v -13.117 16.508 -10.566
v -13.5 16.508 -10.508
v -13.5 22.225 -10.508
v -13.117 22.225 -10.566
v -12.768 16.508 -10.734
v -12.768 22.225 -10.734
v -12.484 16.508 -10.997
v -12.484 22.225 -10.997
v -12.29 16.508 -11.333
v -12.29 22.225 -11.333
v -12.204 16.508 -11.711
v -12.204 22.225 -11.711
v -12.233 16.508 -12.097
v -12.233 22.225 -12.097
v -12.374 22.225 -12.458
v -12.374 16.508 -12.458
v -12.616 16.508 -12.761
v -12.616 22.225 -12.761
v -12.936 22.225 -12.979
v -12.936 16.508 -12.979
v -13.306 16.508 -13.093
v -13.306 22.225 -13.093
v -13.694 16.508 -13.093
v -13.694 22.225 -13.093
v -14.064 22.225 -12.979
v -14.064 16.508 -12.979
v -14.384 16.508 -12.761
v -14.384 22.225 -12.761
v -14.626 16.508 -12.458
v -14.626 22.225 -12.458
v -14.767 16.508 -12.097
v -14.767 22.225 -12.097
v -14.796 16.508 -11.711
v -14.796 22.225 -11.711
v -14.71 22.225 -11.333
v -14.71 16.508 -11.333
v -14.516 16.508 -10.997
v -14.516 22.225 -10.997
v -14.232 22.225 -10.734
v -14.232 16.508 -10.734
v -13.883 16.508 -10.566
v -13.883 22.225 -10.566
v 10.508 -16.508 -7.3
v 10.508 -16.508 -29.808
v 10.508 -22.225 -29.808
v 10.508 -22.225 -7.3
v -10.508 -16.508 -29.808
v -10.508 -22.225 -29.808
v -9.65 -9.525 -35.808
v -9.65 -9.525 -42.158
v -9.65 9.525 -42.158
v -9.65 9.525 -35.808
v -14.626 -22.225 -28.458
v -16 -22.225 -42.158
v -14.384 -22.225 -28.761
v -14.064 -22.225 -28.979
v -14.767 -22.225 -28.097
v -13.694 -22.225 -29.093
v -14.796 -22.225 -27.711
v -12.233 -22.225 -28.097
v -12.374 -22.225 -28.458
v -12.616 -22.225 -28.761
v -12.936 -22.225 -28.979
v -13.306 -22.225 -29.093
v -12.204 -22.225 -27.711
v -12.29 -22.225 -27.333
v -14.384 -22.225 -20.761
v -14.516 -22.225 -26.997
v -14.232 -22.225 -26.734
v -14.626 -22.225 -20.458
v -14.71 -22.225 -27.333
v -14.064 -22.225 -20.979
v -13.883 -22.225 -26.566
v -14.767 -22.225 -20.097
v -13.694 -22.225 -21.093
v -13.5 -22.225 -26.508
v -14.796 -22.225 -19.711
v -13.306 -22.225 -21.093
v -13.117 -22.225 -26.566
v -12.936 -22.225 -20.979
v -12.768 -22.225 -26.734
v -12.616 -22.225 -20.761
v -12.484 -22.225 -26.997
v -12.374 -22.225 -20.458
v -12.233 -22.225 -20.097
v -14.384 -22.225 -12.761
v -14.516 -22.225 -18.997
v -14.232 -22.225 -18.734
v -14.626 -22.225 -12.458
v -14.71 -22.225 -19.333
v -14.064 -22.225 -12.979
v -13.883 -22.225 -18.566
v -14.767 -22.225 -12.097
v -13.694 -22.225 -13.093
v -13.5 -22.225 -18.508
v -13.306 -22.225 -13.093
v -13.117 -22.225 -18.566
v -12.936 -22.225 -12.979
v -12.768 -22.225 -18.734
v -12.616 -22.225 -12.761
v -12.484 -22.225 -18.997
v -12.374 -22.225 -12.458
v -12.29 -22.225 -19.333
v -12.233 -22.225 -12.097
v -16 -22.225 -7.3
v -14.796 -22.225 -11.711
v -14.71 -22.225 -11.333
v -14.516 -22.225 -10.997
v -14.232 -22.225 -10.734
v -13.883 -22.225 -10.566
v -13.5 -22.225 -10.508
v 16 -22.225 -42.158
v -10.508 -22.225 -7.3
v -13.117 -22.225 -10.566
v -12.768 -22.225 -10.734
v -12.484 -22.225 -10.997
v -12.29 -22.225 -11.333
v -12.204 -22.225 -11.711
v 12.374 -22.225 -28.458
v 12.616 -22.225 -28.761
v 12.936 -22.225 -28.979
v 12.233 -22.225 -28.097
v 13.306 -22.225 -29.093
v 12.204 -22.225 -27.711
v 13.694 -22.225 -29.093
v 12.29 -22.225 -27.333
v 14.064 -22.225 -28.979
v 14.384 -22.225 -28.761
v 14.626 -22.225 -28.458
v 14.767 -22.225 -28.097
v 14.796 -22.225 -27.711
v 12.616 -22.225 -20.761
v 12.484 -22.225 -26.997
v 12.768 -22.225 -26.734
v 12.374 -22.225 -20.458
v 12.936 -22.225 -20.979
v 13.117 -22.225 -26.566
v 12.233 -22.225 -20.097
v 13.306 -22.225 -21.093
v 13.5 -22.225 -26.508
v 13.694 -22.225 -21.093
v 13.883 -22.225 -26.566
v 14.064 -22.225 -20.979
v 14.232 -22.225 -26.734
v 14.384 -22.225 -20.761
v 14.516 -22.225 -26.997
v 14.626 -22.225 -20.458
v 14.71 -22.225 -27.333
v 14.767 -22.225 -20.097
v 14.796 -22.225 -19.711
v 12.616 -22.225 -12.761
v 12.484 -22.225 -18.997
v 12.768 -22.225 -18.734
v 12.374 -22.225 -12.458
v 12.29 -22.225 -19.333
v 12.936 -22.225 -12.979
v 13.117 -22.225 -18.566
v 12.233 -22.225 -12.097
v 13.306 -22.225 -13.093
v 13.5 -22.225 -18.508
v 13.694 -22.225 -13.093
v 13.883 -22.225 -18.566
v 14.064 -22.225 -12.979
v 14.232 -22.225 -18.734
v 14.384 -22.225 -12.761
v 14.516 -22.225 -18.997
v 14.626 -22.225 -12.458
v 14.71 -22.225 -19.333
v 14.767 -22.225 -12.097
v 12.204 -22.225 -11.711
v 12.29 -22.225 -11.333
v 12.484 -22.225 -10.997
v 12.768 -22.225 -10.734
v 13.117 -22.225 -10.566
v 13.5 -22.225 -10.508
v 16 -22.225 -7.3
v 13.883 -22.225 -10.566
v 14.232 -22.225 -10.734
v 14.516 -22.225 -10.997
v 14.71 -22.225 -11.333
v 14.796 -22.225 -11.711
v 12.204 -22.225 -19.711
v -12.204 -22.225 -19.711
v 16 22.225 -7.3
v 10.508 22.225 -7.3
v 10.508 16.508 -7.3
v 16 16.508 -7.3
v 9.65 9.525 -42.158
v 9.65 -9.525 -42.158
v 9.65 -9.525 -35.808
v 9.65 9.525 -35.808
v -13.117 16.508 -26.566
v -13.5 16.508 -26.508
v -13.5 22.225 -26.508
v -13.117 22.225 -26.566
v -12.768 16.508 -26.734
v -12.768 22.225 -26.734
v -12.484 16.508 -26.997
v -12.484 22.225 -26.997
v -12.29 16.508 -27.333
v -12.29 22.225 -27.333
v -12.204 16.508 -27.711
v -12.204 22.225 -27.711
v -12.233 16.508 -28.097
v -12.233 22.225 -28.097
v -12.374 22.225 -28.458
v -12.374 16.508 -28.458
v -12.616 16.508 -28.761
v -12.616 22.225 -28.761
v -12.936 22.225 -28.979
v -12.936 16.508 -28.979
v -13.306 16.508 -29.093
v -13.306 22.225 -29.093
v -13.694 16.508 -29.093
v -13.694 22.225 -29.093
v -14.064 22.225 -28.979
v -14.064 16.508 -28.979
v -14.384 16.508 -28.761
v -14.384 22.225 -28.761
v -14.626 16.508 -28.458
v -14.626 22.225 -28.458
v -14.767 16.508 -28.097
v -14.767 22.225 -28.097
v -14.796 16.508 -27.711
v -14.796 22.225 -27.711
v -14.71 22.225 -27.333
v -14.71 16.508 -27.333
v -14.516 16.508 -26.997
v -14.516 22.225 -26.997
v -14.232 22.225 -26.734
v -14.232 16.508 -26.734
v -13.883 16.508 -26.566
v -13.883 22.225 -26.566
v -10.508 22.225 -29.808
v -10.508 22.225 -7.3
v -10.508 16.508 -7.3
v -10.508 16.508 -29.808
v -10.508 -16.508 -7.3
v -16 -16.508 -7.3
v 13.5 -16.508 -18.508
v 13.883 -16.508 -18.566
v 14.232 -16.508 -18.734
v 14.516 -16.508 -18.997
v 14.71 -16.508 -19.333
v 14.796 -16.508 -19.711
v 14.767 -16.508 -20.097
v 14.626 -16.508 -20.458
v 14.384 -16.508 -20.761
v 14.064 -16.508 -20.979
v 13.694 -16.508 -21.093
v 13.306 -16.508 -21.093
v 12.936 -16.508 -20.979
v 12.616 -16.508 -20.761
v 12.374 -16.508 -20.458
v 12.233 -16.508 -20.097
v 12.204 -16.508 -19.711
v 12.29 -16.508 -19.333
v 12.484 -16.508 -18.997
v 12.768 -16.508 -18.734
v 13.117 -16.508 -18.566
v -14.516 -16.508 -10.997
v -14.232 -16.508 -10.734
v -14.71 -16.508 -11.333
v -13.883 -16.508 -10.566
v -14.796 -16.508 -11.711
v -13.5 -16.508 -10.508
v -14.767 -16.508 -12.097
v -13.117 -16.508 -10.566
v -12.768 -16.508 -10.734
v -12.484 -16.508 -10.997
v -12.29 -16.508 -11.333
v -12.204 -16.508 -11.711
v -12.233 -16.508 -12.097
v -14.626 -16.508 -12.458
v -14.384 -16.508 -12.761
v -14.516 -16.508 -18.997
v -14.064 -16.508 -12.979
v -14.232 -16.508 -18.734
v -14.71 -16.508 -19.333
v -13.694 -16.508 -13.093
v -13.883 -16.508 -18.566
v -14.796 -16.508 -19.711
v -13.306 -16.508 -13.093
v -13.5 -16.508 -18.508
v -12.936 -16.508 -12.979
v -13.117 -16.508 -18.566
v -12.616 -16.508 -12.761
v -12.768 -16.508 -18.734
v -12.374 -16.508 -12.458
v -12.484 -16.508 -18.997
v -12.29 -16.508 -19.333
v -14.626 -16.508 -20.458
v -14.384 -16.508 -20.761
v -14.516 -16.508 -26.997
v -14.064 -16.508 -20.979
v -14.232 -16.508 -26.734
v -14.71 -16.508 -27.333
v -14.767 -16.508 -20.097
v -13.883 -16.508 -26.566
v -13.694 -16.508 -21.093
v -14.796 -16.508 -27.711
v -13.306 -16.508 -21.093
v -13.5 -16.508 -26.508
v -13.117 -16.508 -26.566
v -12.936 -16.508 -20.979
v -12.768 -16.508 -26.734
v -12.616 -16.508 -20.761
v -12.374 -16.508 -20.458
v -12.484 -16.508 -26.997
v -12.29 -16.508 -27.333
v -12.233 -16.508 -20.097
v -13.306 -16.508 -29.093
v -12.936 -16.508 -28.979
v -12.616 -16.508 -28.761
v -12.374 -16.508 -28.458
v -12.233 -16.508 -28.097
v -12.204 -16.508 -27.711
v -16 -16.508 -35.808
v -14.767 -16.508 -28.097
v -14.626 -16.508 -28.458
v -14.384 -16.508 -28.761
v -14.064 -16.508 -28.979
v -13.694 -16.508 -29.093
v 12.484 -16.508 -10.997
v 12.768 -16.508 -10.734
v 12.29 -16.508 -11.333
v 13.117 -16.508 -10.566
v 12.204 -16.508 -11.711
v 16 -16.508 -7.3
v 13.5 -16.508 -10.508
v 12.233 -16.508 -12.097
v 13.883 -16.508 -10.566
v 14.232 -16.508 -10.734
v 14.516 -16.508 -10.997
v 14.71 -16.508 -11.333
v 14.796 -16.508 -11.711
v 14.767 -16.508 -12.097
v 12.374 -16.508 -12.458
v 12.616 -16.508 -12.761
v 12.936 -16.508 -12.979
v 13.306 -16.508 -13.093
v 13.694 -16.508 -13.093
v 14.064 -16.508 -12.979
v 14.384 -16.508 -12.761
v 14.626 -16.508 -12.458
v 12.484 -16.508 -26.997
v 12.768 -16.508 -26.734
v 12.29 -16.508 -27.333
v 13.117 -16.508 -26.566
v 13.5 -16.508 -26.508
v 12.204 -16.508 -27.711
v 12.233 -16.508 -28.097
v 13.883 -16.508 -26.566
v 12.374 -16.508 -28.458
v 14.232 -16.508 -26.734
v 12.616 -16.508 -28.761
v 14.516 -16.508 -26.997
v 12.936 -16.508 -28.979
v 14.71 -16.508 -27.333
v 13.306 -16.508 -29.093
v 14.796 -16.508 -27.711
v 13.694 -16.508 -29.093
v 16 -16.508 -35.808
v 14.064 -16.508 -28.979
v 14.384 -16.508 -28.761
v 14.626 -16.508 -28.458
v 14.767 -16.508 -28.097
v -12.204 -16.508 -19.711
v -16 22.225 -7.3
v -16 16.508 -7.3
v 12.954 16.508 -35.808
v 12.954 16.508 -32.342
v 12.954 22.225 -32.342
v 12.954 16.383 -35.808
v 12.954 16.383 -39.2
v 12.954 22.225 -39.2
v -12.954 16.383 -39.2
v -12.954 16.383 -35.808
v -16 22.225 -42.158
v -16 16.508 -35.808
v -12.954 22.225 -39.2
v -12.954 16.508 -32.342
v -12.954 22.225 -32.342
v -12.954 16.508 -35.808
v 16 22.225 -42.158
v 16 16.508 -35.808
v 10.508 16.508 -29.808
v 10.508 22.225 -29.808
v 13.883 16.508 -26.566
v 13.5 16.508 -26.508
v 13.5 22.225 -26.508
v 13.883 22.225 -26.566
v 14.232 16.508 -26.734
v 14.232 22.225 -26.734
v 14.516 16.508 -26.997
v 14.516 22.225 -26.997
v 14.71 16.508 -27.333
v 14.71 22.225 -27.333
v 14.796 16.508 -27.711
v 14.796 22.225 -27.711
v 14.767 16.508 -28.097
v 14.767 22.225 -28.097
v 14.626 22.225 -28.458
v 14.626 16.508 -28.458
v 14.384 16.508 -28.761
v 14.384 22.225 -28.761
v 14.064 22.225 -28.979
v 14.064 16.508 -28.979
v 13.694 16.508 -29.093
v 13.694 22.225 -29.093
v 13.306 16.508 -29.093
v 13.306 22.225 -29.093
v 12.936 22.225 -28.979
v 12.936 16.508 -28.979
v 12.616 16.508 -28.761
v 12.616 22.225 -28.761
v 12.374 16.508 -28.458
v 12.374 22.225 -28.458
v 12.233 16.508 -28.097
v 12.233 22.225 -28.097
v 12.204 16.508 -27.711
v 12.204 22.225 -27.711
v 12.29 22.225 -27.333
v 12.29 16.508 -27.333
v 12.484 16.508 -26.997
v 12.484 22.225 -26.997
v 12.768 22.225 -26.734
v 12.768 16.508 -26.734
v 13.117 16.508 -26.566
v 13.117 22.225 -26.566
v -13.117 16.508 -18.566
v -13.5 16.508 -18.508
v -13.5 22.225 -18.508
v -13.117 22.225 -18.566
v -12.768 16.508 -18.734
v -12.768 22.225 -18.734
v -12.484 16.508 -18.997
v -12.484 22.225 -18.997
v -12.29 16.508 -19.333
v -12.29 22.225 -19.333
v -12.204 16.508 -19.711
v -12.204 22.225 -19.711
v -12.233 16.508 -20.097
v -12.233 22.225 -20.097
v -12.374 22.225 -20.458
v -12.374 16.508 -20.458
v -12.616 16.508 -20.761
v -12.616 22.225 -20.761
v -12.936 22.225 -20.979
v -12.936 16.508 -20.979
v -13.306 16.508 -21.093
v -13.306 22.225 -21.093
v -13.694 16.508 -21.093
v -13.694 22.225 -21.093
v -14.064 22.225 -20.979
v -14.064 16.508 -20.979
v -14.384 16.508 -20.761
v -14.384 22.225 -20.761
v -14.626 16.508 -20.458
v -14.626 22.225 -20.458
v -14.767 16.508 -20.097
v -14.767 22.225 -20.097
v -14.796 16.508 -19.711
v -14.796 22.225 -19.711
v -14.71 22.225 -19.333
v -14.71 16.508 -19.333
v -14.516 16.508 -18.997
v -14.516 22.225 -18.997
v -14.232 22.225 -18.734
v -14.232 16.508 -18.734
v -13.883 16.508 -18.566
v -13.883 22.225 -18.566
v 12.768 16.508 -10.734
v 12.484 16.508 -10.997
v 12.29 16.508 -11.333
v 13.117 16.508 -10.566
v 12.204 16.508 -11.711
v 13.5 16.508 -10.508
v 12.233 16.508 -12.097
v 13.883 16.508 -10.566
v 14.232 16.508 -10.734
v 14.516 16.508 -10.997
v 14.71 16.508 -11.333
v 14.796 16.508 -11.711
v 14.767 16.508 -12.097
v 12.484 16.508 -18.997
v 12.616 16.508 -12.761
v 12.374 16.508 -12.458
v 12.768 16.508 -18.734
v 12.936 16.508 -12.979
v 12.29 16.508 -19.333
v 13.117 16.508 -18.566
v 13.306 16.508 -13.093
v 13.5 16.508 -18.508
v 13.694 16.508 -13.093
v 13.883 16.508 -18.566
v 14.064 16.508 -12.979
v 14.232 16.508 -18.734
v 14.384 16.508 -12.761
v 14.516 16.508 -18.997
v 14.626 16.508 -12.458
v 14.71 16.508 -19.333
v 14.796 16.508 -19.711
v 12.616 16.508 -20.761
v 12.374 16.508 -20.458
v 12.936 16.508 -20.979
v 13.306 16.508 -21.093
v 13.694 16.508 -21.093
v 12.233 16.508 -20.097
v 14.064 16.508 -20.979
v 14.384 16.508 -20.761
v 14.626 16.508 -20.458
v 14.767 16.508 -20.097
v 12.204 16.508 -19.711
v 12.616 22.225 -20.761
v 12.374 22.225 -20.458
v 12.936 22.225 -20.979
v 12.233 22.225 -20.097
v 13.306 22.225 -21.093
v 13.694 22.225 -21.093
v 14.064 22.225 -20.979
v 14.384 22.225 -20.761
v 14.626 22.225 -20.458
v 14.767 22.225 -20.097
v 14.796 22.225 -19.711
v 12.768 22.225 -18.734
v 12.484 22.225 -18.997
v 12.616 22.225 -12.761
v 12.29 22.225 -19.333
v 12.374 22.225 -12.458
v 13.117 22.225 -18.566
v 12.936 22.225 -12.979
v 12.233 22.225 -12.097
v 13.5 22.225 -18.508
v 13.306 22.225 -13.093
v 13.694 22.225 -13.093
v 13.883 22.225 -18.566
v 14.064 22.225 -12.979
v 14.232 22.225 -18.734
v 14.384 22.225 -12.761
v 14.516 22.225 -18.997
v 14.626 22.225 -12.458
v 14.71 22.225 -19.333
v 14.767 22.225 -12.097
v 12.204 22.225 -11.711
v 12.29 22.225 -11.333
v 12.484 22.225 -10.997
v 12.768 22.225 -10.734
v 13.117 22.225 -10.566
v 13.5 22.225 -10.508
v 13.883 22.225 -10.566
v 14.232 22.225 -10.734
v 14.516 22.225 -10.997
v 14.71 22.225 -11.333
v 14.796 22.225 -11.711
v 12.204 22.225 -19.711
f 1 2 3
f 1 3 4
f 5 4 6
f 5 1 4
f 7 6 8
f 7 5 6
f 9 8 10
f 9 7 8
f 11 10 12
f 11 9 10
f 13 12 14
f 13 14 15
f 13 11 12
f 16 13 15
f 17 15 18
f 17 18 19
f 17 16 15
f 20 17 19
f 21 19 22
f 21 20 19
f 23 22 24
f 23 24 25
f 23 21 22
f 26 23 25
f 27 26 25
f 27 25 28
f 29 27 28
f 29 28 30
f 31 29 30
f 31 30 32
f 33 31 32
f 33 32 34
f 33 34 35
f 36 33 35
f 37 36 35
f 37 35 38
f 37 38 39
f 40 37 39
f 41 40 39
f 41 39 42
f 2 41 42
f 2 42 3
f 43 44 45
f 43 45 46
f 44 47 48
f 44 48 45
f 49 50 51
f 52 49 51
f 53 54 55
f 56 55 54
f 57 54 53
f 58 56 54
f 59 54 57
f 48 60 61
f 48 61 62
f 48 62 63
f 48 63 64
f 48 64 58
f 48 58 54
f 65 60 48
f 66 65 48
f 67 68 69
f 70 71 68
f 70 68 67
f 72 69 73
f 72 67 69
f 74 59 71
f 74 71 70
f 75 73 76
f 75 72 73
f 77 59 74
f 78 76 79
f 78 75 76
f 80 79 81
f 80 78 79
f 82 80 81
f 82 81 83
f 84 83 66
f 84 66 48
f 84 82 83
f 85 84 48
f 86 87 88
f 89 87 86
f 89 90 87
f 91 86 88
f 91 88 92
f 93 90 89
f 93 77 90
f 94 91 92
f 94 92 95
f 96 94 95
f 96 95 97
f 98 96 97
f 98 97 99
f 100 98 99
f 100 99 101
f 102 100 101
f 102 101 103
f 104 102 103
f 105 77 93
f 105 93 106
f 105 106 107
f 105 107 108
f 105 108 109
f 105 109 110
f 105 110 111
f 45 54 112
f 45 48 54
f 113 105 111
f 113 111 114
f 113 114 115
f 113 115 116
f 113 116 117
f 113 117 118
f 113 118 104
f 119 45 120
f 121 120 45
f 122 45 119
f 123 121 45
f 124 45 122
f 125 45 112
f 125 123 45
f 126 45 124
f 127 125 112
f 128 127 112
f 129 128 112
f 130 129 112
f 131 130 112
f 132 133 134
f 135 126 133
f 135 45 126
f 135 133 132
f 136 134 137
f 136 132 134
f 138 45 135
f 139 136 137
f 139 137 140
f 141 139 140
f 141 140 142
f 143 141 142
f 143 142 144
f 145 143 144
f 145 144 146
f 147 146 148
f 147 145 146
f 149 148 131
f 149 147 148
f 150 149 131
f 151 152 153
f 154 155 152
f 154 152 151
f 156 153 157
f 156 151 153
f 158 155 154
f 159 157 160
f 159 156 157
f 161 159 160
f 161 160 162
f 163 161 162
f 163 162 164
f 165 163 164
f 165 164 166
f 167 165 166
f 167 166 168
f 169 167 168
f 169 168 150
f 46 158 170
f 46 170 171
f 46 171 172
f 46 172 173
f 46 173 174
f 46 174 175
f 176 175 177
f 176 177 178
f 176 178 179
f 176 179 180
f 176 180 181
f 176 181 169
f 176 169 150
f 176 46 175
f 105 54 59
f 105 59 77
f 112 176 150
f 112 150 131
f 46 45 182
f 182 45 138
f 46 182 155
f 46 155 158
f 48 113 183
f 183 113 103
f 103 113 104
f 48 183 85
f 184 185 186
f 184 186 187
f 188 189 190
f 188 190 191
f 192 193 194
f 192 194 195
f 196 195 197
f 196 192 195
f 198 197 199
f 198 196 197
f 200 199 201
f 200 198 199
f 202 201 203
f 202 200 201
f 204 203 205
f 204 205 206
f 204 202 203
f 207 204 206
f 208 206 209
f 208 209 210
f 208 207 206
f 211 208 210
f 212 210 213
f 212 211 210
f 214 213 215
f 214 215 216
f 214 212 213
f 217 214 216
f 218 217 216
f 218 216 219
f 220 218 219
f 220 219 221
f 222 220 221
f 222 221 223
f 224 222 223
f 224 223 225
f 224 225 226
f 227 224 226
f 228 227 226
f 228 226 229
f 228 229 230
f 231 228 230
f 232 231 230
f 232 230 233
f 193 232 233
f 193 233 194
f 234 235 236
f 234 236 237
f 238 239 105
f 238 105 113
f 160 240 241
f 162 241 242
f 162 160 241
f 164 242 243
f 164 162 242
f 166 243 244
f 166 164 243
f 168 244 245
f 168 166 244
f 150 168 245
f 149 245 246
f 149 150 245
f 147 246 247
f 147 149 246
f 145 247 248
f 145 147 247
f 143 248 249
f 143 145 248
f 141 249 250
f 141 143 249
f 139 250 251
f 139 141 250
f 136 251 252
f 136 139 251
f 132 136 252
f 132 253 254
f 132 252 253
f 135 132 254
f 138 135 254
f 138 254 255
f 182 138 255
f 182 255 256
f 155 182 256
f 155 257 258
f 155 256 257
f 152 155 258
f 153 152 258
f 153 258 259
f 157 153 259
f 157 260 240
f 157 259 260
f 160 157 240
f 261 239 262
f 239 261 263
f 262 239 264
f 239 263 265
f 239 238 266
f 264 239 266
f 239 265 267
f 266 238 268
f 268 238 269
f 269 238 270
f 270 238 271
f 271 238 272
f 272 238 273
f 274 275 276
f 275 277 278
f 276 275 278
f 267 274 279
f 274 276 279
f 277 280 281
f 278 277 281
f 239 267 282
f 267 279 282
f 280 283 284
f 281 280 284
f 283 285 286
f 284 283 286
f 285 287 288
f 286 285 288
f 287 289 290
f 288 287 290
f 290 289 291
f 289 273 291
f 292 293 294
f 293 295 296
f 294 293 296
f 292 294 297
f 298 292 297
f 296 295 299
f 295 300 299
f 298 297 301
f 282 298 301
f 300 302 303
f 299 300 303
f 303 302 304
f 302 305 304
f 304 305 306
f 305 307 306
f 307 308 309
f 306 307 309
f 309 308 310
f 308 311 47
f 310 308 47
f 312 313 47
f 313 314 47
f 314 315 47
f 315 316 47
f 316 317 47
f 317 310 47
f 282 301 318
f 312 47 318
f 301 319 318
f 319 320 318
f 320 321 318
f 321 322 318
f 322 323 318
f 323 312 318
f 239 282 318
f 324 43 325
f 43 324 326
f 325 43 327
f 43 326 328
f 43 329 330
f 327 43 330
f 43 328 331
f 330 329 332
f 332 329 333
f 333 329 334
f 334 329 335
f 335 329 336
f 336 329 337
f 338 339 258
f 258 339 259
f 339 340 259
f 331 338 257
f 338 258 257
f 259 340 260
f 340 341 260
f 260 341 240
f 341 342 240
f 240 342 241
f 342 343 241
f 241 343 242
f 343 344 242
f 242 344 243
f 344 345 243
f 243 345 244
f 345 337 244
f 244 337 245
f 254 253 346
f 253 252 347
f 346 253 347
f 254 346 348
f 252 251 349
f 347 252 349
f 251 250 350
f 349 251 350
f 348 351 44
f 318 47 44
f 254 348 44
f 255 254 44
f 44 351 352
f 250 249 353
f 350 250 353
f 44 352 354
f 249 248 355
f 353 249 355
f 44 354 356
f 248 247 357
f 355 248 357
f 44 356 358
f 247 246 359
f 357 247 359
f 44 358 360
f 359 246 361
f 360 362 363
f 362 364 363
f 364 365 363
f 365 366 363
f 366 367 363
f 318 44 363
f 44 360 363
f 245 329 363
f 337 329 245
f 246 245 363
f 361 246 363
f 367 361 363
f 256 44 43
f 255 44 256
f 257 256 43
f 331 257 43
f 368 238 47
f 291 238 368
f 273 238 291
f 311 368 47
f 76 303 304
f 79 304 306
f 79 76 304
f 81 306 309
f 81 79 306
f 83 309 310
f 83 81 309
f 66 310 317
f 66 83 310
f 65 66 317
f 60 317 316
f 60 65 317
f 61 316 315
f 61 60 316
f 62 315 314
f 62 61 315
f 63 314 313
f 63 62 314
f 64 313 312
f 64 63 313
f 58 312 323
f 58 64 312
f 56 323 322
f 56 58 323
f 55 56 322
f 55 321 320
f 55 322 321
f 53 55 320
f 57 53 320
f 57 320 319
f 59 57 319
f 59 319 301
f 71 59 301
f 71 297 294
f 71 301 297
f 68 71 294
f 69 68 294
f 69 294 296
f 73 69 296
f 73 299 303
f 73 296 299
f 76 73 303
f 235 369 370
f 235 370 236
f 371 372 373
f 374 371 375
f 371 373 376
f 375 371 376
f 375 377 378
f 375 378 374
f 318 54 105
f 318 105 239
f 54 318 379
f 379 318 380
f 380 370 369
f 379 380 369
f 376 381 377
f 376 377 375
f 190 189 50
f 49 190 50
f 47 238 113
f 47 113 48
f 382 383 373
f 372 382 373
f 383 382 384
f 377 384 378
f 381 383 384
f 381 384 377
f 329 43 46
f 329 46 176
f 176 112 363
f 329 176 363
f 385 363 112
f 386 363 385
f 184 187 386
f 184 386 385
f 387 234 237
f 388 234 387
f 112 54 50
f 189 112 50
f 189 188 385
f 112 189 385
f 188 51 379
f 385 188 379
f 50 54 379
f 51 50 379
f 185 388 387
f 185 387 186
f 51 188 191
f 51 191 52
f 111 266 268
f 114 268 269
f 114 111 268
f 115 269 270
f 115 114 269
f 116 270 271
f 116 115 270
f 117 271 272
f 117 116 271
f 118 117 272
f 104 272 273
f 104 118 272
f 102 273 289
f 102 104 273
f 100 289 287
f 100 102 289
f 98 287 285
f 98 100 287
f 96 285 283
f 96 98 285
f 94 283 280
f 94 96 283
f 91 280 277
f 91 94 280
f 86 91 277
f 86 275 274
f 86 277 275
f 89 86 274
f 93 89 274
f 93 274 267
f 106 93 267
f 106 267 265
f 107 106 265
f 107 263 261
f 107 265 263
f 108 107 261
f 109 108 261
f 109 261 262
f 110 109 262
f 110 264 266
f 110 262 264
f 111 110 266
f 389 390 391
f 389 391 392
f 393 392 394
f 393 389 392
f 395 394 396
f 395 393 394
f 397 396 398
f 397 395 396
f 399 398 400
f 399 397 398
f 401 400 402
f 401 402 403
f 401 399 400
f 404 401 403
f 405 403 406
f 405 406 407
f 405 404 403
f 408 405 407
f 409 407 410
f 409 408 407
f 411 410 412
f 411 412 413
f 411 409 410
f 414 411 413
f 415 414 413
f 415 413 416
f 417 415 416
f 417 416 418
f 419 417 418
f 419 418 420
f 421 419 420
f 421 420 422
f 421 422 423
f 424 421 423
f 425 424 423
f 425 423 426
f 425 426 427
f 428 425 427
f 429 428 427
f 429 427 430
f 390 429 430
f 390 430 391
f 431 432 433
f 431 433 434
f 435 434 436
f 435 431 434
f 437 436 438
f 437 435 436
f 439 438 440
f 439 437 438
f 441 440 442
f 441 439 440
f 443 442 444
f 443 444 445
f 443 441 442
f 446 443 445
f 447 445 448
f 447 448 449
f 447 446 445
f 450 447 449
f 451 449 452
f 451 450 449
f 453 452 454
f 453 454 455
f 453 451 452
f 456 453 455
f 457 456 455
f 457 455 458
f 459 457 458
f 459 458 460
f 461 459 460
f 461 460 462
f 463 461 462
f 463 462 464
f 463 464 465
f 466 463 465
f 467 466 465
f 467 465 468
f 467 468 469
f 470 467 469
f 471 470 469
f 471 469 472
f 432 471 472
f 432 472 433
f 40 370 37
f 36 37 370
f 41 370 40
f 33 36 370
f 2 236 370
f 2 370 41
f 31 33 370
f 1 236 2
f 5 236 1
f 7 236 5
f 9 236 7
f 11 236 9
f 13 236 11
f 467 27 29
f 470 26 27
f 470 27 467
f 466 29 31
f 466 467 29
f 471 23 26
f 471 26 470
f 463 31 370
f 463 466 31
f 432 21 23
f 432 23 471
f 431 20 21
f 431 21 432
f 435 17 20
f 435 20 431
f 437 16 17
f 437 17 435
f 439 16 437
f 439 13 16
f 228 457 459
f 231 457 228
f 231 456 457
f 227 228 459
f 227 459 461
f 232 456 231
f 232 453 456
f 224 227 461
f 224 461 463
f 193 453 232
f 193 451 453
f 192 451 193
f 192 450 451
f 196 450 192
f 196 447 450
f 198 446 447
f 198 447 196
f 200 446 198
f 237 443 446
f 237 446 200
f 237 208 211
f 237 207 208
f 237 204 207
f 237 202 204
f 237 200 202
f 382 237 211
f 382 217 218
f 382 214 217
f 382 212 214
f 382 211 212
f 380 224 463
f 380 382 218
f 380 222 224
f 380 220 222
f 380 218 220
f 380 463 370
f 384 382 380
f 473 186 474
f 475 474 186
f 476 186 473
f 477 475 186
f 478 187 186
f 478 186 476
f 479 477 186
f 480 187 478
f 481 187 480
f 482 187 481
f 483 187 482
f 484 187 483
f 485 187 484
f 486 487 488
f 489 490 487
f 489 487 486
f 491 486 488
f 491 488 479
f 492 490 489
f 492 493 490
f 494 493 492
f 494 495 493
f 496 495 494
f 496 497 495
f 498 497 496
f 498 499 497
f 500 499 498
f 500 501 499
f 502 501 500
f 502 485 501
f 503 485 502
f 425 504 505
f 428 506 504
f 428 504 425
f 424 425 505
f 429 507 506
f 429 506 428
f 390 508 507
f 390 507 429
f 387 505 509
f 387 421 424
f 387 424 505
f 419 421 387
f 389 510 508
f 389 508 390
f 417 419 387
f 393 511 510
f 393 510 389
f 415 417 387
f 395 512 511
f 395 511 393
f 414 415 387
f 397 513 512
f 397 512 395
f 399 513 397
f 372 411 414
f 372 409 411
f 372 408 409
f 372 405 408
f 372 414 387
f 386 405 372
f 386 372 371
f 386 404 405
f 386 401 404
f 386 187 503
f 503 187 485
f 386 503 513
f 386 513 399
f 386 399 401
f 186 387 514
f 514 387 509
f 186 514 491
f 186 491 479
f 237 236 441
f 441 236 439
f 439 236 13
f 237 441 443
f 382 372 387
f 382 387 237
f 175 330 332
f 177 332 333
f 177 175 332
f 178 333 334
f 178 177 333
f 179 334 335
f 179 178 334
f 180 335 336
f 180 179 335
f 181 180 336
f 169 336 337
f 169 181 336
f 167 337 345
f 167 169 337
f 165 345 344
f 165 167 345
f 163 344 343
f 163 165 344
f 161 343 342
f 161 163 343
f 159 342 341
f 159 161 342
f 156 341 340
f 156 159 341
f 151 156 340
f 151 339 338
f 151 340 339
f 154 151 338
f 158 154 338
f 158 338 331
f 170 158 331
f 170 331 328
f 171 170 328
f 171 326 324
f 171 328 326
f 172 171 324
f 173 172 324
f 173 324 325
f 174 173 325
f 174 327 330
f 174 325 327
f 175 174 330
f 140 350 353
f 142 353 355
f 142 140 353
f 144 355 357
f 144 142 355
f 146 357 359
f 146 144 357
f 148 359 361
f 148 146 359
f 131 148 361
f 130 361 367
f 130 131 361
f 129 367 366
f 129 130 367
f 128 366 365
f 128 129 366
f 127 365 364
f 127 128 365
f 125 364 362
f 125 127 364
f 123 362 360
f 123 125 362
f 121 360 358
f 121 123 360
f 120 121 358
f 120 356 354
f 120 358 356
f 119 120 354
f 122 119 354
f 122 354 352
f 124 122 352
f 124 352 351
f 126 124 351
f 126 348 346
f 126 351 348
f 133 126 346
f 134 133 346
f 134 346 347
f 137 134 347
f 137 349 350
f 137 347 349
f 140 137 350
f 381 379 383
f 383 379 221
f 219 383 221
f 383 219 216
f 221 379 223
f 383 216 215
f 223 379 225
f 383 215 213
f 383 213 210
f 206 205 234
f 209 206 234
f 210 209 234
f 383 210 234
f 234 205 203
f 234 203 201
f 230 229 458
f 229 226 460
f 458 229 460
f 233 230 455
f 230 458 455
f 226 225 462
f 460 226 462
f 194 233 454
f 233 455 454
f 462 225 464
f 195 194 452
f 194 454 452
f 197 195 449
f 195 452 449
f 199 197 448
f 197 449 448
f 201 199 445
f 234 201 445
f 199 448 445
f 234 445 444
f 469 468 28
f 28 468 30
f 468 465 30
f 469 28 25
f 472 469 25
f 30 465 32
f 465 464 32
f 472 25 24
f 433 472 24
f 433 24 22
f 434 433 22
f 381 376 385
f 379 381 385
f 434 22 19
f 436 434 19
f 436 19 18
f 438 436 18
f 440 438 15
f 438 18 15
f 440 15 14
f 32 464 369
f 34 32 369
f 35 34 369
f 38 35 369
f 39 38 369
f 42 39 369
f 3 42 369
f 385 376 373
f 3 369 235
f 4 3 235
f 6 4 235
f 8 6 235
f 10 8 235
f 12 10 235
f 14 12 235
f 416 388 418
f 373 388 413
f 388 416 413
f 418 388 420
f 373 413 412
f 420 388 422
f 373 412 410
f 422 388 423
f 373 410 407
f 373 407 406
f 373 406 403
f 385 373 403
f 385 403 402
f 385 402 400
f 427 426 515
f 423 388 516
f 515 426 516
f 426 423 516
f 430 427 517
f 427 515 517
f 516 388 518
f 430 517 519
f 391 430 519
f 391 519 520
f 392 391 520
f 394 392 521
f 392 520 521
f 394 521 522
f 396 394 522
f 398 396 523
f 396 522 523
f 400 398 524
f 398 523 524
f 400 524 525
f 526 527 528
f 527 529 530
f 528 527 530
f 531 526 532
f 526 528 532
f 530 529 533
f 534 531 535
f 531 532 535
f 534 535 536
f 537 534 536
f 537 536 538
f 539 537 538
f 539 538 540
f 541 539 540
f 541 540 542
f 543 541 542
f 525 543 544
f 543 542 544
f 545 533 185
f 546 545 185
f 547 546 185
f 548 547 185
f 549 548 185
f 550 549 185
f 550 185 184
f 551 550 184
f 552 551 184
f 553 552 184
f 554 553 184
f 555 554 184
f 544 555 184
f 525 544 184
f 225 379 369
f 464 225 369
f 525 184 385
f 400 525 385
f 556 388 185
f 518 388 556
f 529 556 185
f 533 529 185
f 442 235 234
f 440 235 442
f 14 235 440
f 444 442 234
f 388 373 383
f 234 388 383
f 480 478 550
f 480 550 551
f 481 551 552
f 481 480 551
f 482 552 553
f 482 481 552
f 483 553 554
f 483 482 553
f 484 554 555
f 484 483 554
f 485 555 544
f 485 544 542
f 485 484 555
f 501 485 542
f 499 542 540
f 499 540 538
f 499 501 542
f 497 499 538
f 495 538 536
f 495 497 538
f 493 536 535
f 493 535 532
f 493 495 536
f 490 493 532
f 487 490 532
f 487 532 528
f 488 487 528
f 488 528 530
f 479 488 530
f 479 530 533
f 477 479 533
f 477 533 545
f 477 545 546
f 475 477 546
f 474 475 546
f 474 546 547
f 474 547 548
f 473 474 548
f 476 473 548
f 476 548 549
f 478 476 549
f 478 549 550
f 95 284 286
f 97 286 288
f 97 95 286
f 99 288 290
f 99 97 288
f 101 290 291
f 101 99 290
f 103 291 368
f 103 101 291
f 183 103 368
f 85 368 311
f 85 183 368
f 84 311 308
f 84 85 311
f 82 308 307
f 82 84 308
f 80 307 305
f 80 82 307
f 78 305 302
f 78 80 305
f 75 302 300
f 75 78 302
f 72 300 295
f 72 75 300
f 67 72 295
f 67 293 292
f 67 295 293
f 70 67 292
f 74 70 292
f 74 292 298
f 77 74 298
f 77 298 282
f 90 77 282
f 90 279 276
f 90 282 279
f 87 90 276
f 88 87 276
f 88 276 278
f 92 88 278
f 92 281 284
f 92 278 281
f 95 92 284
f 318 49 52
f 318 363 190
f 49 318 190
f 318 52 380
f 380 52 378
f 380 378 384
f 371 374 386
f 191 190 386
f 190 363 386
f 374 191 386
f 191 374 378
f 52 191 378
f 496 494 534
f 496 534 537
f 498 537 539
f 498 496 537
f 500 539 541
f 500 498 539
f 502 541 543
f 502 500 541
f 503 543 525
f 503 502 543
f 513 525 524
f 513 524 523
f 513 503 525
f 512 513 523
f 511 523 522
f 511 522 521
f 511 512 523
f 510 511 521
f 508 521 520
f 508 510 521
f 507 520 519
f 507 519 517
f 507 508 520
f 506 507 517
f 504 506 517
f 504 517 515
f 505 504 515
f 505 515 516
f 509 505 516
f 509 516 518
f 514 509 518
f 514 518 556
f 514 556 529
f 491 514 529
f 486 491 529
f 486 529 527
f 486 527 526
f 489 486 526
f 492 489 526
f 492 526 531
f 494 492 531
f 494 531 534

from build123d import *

# Parameters (mm, degrees)
SKETCH1_W           = 32
SKETCH1_H           = 44.45
BOSS_EXTRUDE1_DEPTH = 50.8
SKETCH2_W           = 35.808
SKETCH2_H           = 33.016
CUT_EXTRUDE1_DEPTH  = 32
CUT_EXTRUDE2_REACH  = 71.372
SKETCH4_W           = 8.642
SKETCH4_H           = 44.45
CUT_EXTRUDE3_DEPTH  = 65.020236059
SKETCH6_W           = 25.908
SKETCH6_H           = 6.858
CUT_EXTRUDE4_DEPTH  = 5.842
CUT_EXTRUDE5_START  = -44.45
SKETCH7_R           = 1.3
CUT_EXTRUDE5_DEPTH  = 44.45
SKETCH8_W           = 19.3
SKETCH8_H           = 19.05
CUT_EXTRUDE6_DEPTH  = 45.328667801


with BuildPart() as part:
    # Sketch1 → Boss-Extrude1 (new body)
    with BuildSketch(Plane.XY):
        Rectangle(SKETCH1_W, SKETCH1_H)
    extrude(amount=-BOSS_EXTRUDE1_DEPTH)

    # Sketch2 → Cut-Extrude1 (cut)
    with BuildSketch(Plane(origin=(16, 0, 0), x_dir=(0, 0, -1), z_dir=(1, 0, 0))):
        with Locations((17.904, 0)):
            Rectangle(SKETCH2_W, SKETCH2_H)
    extrude(amount=-CUT_EXTRUDE1_DEPTH, mode=Mode.SUBTRACT)

    # Cut-Extrude2: up to this face of the body (flat: up to its plane)
    cut_extrude2_end = Plane(part.part.faces().sort_by_distance((0, -22.225, -25.4))[0])
    # Sketch3 → Cut-Extrude2 (cut, up to the picked face)
    with BuildSketch(Plane(origin=(0, 22.225, 0), x_dir=(1, 0, 0), z_dir=(0, 1, 0)), mode=Mode.PRIVATE) as cut_extrude2_sk1:
        Polygon((-10.508, 7.3), (-10.508, 29.808), (10.508, 29.808), (10.508, 7.3), (16, 7.3), (16, 0), (-16, 0), (-16, 7.3), align=None)
    cut_extrude2_tool1 = split(extrude(cut_extrude2_sk1.sketch, amount=-CUT_EXTRUDE2_REACH, mode=Mode.PRIVATE), bisect_by=cut_extrude2_end, keep=Keep.BOTH, mode=Mode.PRIVATE)
    add(cut_extrude2_tool1.solids().sort_by(Axis((0, 22.225, -13.626975), (0, -1, 0)))[0], mode=Mode.SUBTRACT)

    # Sketch4 → Cut-Extrude3 (cut, through all)
    with BuildSketch(Plane.ZY.offset(16)):
        with Locations((-46.479, 0)):
            Rectangle(SKETCH4_W, SKETCH4_H)
    extrude(amount=-CUT_EXTRUDE3_DEPTH, mode=Mode.SUBTRACT)

    # Sketch6 → Cut-Extrude4 (cut)
    with BuildSketch(Plane(origin=(0, 22.225, 0), x_dir=(1, 0, 0), z_dir=(0, 1, 0))):
        with Locations((0, 35.771215189)):
            Rectangle(SKETCH6_W, SKETCH6_H)
    extrude(amount=-CUT_EXTRUDE4_DEPTH, mode=Mode.SUBTRACT)

    # Sketch7 → Cut-Extrude5 (cut)
    with BuildSketch(Plane(origin=(0, 22.225, 0), x_dir=(1, 0, 0), z_dir=(0, 1, 0)).offset(CUT_EXTRUDE5_START)):
        with Locations(Location((-13.5, 11.808, 0), (0, 0, 270))):
            Circle(SKETCH7_R)
        with Locations(Location((-13.5, 19.808, 0), (0, 0, 270))):
            Circle(SKETCH7_R)
        with Locations(Location((-13.5, 27.808, 0), (0, 0, 270))):
            Circle(SKETCH7_R)
        with Locations(Location((13.5, 27.808, 0), (0, 0, 270))):
            Circle(SKETCH7_R)
        with Locations(Location((13.5, 19.808, 0), (0, 0, 270))):
            Circle(SKETCH7_R)
        with Locations(Location((13.5, 11.808, 0), (0, 0, 270))):
            Circle(SKETCH7_R)
    extrude(amount=CUT_EXTRUDE5_DEPTH, mode=Mode.SUBTRACT)

    # Sketch8 → Cut-Extrude6 (cut, through all)
    with BuildSketch(Plane(origin=(0, 0, -42.158), x_dir=(-1, 0, 0), z_dir=(0, 0, -1))):
        Rectangle(SKETCH8_W, SKETCH8_H)
    extrude(amount=-CUT_EXTRUDE6_DEPTH, mode=Mode.SUBTRACT)


solid = part.part
